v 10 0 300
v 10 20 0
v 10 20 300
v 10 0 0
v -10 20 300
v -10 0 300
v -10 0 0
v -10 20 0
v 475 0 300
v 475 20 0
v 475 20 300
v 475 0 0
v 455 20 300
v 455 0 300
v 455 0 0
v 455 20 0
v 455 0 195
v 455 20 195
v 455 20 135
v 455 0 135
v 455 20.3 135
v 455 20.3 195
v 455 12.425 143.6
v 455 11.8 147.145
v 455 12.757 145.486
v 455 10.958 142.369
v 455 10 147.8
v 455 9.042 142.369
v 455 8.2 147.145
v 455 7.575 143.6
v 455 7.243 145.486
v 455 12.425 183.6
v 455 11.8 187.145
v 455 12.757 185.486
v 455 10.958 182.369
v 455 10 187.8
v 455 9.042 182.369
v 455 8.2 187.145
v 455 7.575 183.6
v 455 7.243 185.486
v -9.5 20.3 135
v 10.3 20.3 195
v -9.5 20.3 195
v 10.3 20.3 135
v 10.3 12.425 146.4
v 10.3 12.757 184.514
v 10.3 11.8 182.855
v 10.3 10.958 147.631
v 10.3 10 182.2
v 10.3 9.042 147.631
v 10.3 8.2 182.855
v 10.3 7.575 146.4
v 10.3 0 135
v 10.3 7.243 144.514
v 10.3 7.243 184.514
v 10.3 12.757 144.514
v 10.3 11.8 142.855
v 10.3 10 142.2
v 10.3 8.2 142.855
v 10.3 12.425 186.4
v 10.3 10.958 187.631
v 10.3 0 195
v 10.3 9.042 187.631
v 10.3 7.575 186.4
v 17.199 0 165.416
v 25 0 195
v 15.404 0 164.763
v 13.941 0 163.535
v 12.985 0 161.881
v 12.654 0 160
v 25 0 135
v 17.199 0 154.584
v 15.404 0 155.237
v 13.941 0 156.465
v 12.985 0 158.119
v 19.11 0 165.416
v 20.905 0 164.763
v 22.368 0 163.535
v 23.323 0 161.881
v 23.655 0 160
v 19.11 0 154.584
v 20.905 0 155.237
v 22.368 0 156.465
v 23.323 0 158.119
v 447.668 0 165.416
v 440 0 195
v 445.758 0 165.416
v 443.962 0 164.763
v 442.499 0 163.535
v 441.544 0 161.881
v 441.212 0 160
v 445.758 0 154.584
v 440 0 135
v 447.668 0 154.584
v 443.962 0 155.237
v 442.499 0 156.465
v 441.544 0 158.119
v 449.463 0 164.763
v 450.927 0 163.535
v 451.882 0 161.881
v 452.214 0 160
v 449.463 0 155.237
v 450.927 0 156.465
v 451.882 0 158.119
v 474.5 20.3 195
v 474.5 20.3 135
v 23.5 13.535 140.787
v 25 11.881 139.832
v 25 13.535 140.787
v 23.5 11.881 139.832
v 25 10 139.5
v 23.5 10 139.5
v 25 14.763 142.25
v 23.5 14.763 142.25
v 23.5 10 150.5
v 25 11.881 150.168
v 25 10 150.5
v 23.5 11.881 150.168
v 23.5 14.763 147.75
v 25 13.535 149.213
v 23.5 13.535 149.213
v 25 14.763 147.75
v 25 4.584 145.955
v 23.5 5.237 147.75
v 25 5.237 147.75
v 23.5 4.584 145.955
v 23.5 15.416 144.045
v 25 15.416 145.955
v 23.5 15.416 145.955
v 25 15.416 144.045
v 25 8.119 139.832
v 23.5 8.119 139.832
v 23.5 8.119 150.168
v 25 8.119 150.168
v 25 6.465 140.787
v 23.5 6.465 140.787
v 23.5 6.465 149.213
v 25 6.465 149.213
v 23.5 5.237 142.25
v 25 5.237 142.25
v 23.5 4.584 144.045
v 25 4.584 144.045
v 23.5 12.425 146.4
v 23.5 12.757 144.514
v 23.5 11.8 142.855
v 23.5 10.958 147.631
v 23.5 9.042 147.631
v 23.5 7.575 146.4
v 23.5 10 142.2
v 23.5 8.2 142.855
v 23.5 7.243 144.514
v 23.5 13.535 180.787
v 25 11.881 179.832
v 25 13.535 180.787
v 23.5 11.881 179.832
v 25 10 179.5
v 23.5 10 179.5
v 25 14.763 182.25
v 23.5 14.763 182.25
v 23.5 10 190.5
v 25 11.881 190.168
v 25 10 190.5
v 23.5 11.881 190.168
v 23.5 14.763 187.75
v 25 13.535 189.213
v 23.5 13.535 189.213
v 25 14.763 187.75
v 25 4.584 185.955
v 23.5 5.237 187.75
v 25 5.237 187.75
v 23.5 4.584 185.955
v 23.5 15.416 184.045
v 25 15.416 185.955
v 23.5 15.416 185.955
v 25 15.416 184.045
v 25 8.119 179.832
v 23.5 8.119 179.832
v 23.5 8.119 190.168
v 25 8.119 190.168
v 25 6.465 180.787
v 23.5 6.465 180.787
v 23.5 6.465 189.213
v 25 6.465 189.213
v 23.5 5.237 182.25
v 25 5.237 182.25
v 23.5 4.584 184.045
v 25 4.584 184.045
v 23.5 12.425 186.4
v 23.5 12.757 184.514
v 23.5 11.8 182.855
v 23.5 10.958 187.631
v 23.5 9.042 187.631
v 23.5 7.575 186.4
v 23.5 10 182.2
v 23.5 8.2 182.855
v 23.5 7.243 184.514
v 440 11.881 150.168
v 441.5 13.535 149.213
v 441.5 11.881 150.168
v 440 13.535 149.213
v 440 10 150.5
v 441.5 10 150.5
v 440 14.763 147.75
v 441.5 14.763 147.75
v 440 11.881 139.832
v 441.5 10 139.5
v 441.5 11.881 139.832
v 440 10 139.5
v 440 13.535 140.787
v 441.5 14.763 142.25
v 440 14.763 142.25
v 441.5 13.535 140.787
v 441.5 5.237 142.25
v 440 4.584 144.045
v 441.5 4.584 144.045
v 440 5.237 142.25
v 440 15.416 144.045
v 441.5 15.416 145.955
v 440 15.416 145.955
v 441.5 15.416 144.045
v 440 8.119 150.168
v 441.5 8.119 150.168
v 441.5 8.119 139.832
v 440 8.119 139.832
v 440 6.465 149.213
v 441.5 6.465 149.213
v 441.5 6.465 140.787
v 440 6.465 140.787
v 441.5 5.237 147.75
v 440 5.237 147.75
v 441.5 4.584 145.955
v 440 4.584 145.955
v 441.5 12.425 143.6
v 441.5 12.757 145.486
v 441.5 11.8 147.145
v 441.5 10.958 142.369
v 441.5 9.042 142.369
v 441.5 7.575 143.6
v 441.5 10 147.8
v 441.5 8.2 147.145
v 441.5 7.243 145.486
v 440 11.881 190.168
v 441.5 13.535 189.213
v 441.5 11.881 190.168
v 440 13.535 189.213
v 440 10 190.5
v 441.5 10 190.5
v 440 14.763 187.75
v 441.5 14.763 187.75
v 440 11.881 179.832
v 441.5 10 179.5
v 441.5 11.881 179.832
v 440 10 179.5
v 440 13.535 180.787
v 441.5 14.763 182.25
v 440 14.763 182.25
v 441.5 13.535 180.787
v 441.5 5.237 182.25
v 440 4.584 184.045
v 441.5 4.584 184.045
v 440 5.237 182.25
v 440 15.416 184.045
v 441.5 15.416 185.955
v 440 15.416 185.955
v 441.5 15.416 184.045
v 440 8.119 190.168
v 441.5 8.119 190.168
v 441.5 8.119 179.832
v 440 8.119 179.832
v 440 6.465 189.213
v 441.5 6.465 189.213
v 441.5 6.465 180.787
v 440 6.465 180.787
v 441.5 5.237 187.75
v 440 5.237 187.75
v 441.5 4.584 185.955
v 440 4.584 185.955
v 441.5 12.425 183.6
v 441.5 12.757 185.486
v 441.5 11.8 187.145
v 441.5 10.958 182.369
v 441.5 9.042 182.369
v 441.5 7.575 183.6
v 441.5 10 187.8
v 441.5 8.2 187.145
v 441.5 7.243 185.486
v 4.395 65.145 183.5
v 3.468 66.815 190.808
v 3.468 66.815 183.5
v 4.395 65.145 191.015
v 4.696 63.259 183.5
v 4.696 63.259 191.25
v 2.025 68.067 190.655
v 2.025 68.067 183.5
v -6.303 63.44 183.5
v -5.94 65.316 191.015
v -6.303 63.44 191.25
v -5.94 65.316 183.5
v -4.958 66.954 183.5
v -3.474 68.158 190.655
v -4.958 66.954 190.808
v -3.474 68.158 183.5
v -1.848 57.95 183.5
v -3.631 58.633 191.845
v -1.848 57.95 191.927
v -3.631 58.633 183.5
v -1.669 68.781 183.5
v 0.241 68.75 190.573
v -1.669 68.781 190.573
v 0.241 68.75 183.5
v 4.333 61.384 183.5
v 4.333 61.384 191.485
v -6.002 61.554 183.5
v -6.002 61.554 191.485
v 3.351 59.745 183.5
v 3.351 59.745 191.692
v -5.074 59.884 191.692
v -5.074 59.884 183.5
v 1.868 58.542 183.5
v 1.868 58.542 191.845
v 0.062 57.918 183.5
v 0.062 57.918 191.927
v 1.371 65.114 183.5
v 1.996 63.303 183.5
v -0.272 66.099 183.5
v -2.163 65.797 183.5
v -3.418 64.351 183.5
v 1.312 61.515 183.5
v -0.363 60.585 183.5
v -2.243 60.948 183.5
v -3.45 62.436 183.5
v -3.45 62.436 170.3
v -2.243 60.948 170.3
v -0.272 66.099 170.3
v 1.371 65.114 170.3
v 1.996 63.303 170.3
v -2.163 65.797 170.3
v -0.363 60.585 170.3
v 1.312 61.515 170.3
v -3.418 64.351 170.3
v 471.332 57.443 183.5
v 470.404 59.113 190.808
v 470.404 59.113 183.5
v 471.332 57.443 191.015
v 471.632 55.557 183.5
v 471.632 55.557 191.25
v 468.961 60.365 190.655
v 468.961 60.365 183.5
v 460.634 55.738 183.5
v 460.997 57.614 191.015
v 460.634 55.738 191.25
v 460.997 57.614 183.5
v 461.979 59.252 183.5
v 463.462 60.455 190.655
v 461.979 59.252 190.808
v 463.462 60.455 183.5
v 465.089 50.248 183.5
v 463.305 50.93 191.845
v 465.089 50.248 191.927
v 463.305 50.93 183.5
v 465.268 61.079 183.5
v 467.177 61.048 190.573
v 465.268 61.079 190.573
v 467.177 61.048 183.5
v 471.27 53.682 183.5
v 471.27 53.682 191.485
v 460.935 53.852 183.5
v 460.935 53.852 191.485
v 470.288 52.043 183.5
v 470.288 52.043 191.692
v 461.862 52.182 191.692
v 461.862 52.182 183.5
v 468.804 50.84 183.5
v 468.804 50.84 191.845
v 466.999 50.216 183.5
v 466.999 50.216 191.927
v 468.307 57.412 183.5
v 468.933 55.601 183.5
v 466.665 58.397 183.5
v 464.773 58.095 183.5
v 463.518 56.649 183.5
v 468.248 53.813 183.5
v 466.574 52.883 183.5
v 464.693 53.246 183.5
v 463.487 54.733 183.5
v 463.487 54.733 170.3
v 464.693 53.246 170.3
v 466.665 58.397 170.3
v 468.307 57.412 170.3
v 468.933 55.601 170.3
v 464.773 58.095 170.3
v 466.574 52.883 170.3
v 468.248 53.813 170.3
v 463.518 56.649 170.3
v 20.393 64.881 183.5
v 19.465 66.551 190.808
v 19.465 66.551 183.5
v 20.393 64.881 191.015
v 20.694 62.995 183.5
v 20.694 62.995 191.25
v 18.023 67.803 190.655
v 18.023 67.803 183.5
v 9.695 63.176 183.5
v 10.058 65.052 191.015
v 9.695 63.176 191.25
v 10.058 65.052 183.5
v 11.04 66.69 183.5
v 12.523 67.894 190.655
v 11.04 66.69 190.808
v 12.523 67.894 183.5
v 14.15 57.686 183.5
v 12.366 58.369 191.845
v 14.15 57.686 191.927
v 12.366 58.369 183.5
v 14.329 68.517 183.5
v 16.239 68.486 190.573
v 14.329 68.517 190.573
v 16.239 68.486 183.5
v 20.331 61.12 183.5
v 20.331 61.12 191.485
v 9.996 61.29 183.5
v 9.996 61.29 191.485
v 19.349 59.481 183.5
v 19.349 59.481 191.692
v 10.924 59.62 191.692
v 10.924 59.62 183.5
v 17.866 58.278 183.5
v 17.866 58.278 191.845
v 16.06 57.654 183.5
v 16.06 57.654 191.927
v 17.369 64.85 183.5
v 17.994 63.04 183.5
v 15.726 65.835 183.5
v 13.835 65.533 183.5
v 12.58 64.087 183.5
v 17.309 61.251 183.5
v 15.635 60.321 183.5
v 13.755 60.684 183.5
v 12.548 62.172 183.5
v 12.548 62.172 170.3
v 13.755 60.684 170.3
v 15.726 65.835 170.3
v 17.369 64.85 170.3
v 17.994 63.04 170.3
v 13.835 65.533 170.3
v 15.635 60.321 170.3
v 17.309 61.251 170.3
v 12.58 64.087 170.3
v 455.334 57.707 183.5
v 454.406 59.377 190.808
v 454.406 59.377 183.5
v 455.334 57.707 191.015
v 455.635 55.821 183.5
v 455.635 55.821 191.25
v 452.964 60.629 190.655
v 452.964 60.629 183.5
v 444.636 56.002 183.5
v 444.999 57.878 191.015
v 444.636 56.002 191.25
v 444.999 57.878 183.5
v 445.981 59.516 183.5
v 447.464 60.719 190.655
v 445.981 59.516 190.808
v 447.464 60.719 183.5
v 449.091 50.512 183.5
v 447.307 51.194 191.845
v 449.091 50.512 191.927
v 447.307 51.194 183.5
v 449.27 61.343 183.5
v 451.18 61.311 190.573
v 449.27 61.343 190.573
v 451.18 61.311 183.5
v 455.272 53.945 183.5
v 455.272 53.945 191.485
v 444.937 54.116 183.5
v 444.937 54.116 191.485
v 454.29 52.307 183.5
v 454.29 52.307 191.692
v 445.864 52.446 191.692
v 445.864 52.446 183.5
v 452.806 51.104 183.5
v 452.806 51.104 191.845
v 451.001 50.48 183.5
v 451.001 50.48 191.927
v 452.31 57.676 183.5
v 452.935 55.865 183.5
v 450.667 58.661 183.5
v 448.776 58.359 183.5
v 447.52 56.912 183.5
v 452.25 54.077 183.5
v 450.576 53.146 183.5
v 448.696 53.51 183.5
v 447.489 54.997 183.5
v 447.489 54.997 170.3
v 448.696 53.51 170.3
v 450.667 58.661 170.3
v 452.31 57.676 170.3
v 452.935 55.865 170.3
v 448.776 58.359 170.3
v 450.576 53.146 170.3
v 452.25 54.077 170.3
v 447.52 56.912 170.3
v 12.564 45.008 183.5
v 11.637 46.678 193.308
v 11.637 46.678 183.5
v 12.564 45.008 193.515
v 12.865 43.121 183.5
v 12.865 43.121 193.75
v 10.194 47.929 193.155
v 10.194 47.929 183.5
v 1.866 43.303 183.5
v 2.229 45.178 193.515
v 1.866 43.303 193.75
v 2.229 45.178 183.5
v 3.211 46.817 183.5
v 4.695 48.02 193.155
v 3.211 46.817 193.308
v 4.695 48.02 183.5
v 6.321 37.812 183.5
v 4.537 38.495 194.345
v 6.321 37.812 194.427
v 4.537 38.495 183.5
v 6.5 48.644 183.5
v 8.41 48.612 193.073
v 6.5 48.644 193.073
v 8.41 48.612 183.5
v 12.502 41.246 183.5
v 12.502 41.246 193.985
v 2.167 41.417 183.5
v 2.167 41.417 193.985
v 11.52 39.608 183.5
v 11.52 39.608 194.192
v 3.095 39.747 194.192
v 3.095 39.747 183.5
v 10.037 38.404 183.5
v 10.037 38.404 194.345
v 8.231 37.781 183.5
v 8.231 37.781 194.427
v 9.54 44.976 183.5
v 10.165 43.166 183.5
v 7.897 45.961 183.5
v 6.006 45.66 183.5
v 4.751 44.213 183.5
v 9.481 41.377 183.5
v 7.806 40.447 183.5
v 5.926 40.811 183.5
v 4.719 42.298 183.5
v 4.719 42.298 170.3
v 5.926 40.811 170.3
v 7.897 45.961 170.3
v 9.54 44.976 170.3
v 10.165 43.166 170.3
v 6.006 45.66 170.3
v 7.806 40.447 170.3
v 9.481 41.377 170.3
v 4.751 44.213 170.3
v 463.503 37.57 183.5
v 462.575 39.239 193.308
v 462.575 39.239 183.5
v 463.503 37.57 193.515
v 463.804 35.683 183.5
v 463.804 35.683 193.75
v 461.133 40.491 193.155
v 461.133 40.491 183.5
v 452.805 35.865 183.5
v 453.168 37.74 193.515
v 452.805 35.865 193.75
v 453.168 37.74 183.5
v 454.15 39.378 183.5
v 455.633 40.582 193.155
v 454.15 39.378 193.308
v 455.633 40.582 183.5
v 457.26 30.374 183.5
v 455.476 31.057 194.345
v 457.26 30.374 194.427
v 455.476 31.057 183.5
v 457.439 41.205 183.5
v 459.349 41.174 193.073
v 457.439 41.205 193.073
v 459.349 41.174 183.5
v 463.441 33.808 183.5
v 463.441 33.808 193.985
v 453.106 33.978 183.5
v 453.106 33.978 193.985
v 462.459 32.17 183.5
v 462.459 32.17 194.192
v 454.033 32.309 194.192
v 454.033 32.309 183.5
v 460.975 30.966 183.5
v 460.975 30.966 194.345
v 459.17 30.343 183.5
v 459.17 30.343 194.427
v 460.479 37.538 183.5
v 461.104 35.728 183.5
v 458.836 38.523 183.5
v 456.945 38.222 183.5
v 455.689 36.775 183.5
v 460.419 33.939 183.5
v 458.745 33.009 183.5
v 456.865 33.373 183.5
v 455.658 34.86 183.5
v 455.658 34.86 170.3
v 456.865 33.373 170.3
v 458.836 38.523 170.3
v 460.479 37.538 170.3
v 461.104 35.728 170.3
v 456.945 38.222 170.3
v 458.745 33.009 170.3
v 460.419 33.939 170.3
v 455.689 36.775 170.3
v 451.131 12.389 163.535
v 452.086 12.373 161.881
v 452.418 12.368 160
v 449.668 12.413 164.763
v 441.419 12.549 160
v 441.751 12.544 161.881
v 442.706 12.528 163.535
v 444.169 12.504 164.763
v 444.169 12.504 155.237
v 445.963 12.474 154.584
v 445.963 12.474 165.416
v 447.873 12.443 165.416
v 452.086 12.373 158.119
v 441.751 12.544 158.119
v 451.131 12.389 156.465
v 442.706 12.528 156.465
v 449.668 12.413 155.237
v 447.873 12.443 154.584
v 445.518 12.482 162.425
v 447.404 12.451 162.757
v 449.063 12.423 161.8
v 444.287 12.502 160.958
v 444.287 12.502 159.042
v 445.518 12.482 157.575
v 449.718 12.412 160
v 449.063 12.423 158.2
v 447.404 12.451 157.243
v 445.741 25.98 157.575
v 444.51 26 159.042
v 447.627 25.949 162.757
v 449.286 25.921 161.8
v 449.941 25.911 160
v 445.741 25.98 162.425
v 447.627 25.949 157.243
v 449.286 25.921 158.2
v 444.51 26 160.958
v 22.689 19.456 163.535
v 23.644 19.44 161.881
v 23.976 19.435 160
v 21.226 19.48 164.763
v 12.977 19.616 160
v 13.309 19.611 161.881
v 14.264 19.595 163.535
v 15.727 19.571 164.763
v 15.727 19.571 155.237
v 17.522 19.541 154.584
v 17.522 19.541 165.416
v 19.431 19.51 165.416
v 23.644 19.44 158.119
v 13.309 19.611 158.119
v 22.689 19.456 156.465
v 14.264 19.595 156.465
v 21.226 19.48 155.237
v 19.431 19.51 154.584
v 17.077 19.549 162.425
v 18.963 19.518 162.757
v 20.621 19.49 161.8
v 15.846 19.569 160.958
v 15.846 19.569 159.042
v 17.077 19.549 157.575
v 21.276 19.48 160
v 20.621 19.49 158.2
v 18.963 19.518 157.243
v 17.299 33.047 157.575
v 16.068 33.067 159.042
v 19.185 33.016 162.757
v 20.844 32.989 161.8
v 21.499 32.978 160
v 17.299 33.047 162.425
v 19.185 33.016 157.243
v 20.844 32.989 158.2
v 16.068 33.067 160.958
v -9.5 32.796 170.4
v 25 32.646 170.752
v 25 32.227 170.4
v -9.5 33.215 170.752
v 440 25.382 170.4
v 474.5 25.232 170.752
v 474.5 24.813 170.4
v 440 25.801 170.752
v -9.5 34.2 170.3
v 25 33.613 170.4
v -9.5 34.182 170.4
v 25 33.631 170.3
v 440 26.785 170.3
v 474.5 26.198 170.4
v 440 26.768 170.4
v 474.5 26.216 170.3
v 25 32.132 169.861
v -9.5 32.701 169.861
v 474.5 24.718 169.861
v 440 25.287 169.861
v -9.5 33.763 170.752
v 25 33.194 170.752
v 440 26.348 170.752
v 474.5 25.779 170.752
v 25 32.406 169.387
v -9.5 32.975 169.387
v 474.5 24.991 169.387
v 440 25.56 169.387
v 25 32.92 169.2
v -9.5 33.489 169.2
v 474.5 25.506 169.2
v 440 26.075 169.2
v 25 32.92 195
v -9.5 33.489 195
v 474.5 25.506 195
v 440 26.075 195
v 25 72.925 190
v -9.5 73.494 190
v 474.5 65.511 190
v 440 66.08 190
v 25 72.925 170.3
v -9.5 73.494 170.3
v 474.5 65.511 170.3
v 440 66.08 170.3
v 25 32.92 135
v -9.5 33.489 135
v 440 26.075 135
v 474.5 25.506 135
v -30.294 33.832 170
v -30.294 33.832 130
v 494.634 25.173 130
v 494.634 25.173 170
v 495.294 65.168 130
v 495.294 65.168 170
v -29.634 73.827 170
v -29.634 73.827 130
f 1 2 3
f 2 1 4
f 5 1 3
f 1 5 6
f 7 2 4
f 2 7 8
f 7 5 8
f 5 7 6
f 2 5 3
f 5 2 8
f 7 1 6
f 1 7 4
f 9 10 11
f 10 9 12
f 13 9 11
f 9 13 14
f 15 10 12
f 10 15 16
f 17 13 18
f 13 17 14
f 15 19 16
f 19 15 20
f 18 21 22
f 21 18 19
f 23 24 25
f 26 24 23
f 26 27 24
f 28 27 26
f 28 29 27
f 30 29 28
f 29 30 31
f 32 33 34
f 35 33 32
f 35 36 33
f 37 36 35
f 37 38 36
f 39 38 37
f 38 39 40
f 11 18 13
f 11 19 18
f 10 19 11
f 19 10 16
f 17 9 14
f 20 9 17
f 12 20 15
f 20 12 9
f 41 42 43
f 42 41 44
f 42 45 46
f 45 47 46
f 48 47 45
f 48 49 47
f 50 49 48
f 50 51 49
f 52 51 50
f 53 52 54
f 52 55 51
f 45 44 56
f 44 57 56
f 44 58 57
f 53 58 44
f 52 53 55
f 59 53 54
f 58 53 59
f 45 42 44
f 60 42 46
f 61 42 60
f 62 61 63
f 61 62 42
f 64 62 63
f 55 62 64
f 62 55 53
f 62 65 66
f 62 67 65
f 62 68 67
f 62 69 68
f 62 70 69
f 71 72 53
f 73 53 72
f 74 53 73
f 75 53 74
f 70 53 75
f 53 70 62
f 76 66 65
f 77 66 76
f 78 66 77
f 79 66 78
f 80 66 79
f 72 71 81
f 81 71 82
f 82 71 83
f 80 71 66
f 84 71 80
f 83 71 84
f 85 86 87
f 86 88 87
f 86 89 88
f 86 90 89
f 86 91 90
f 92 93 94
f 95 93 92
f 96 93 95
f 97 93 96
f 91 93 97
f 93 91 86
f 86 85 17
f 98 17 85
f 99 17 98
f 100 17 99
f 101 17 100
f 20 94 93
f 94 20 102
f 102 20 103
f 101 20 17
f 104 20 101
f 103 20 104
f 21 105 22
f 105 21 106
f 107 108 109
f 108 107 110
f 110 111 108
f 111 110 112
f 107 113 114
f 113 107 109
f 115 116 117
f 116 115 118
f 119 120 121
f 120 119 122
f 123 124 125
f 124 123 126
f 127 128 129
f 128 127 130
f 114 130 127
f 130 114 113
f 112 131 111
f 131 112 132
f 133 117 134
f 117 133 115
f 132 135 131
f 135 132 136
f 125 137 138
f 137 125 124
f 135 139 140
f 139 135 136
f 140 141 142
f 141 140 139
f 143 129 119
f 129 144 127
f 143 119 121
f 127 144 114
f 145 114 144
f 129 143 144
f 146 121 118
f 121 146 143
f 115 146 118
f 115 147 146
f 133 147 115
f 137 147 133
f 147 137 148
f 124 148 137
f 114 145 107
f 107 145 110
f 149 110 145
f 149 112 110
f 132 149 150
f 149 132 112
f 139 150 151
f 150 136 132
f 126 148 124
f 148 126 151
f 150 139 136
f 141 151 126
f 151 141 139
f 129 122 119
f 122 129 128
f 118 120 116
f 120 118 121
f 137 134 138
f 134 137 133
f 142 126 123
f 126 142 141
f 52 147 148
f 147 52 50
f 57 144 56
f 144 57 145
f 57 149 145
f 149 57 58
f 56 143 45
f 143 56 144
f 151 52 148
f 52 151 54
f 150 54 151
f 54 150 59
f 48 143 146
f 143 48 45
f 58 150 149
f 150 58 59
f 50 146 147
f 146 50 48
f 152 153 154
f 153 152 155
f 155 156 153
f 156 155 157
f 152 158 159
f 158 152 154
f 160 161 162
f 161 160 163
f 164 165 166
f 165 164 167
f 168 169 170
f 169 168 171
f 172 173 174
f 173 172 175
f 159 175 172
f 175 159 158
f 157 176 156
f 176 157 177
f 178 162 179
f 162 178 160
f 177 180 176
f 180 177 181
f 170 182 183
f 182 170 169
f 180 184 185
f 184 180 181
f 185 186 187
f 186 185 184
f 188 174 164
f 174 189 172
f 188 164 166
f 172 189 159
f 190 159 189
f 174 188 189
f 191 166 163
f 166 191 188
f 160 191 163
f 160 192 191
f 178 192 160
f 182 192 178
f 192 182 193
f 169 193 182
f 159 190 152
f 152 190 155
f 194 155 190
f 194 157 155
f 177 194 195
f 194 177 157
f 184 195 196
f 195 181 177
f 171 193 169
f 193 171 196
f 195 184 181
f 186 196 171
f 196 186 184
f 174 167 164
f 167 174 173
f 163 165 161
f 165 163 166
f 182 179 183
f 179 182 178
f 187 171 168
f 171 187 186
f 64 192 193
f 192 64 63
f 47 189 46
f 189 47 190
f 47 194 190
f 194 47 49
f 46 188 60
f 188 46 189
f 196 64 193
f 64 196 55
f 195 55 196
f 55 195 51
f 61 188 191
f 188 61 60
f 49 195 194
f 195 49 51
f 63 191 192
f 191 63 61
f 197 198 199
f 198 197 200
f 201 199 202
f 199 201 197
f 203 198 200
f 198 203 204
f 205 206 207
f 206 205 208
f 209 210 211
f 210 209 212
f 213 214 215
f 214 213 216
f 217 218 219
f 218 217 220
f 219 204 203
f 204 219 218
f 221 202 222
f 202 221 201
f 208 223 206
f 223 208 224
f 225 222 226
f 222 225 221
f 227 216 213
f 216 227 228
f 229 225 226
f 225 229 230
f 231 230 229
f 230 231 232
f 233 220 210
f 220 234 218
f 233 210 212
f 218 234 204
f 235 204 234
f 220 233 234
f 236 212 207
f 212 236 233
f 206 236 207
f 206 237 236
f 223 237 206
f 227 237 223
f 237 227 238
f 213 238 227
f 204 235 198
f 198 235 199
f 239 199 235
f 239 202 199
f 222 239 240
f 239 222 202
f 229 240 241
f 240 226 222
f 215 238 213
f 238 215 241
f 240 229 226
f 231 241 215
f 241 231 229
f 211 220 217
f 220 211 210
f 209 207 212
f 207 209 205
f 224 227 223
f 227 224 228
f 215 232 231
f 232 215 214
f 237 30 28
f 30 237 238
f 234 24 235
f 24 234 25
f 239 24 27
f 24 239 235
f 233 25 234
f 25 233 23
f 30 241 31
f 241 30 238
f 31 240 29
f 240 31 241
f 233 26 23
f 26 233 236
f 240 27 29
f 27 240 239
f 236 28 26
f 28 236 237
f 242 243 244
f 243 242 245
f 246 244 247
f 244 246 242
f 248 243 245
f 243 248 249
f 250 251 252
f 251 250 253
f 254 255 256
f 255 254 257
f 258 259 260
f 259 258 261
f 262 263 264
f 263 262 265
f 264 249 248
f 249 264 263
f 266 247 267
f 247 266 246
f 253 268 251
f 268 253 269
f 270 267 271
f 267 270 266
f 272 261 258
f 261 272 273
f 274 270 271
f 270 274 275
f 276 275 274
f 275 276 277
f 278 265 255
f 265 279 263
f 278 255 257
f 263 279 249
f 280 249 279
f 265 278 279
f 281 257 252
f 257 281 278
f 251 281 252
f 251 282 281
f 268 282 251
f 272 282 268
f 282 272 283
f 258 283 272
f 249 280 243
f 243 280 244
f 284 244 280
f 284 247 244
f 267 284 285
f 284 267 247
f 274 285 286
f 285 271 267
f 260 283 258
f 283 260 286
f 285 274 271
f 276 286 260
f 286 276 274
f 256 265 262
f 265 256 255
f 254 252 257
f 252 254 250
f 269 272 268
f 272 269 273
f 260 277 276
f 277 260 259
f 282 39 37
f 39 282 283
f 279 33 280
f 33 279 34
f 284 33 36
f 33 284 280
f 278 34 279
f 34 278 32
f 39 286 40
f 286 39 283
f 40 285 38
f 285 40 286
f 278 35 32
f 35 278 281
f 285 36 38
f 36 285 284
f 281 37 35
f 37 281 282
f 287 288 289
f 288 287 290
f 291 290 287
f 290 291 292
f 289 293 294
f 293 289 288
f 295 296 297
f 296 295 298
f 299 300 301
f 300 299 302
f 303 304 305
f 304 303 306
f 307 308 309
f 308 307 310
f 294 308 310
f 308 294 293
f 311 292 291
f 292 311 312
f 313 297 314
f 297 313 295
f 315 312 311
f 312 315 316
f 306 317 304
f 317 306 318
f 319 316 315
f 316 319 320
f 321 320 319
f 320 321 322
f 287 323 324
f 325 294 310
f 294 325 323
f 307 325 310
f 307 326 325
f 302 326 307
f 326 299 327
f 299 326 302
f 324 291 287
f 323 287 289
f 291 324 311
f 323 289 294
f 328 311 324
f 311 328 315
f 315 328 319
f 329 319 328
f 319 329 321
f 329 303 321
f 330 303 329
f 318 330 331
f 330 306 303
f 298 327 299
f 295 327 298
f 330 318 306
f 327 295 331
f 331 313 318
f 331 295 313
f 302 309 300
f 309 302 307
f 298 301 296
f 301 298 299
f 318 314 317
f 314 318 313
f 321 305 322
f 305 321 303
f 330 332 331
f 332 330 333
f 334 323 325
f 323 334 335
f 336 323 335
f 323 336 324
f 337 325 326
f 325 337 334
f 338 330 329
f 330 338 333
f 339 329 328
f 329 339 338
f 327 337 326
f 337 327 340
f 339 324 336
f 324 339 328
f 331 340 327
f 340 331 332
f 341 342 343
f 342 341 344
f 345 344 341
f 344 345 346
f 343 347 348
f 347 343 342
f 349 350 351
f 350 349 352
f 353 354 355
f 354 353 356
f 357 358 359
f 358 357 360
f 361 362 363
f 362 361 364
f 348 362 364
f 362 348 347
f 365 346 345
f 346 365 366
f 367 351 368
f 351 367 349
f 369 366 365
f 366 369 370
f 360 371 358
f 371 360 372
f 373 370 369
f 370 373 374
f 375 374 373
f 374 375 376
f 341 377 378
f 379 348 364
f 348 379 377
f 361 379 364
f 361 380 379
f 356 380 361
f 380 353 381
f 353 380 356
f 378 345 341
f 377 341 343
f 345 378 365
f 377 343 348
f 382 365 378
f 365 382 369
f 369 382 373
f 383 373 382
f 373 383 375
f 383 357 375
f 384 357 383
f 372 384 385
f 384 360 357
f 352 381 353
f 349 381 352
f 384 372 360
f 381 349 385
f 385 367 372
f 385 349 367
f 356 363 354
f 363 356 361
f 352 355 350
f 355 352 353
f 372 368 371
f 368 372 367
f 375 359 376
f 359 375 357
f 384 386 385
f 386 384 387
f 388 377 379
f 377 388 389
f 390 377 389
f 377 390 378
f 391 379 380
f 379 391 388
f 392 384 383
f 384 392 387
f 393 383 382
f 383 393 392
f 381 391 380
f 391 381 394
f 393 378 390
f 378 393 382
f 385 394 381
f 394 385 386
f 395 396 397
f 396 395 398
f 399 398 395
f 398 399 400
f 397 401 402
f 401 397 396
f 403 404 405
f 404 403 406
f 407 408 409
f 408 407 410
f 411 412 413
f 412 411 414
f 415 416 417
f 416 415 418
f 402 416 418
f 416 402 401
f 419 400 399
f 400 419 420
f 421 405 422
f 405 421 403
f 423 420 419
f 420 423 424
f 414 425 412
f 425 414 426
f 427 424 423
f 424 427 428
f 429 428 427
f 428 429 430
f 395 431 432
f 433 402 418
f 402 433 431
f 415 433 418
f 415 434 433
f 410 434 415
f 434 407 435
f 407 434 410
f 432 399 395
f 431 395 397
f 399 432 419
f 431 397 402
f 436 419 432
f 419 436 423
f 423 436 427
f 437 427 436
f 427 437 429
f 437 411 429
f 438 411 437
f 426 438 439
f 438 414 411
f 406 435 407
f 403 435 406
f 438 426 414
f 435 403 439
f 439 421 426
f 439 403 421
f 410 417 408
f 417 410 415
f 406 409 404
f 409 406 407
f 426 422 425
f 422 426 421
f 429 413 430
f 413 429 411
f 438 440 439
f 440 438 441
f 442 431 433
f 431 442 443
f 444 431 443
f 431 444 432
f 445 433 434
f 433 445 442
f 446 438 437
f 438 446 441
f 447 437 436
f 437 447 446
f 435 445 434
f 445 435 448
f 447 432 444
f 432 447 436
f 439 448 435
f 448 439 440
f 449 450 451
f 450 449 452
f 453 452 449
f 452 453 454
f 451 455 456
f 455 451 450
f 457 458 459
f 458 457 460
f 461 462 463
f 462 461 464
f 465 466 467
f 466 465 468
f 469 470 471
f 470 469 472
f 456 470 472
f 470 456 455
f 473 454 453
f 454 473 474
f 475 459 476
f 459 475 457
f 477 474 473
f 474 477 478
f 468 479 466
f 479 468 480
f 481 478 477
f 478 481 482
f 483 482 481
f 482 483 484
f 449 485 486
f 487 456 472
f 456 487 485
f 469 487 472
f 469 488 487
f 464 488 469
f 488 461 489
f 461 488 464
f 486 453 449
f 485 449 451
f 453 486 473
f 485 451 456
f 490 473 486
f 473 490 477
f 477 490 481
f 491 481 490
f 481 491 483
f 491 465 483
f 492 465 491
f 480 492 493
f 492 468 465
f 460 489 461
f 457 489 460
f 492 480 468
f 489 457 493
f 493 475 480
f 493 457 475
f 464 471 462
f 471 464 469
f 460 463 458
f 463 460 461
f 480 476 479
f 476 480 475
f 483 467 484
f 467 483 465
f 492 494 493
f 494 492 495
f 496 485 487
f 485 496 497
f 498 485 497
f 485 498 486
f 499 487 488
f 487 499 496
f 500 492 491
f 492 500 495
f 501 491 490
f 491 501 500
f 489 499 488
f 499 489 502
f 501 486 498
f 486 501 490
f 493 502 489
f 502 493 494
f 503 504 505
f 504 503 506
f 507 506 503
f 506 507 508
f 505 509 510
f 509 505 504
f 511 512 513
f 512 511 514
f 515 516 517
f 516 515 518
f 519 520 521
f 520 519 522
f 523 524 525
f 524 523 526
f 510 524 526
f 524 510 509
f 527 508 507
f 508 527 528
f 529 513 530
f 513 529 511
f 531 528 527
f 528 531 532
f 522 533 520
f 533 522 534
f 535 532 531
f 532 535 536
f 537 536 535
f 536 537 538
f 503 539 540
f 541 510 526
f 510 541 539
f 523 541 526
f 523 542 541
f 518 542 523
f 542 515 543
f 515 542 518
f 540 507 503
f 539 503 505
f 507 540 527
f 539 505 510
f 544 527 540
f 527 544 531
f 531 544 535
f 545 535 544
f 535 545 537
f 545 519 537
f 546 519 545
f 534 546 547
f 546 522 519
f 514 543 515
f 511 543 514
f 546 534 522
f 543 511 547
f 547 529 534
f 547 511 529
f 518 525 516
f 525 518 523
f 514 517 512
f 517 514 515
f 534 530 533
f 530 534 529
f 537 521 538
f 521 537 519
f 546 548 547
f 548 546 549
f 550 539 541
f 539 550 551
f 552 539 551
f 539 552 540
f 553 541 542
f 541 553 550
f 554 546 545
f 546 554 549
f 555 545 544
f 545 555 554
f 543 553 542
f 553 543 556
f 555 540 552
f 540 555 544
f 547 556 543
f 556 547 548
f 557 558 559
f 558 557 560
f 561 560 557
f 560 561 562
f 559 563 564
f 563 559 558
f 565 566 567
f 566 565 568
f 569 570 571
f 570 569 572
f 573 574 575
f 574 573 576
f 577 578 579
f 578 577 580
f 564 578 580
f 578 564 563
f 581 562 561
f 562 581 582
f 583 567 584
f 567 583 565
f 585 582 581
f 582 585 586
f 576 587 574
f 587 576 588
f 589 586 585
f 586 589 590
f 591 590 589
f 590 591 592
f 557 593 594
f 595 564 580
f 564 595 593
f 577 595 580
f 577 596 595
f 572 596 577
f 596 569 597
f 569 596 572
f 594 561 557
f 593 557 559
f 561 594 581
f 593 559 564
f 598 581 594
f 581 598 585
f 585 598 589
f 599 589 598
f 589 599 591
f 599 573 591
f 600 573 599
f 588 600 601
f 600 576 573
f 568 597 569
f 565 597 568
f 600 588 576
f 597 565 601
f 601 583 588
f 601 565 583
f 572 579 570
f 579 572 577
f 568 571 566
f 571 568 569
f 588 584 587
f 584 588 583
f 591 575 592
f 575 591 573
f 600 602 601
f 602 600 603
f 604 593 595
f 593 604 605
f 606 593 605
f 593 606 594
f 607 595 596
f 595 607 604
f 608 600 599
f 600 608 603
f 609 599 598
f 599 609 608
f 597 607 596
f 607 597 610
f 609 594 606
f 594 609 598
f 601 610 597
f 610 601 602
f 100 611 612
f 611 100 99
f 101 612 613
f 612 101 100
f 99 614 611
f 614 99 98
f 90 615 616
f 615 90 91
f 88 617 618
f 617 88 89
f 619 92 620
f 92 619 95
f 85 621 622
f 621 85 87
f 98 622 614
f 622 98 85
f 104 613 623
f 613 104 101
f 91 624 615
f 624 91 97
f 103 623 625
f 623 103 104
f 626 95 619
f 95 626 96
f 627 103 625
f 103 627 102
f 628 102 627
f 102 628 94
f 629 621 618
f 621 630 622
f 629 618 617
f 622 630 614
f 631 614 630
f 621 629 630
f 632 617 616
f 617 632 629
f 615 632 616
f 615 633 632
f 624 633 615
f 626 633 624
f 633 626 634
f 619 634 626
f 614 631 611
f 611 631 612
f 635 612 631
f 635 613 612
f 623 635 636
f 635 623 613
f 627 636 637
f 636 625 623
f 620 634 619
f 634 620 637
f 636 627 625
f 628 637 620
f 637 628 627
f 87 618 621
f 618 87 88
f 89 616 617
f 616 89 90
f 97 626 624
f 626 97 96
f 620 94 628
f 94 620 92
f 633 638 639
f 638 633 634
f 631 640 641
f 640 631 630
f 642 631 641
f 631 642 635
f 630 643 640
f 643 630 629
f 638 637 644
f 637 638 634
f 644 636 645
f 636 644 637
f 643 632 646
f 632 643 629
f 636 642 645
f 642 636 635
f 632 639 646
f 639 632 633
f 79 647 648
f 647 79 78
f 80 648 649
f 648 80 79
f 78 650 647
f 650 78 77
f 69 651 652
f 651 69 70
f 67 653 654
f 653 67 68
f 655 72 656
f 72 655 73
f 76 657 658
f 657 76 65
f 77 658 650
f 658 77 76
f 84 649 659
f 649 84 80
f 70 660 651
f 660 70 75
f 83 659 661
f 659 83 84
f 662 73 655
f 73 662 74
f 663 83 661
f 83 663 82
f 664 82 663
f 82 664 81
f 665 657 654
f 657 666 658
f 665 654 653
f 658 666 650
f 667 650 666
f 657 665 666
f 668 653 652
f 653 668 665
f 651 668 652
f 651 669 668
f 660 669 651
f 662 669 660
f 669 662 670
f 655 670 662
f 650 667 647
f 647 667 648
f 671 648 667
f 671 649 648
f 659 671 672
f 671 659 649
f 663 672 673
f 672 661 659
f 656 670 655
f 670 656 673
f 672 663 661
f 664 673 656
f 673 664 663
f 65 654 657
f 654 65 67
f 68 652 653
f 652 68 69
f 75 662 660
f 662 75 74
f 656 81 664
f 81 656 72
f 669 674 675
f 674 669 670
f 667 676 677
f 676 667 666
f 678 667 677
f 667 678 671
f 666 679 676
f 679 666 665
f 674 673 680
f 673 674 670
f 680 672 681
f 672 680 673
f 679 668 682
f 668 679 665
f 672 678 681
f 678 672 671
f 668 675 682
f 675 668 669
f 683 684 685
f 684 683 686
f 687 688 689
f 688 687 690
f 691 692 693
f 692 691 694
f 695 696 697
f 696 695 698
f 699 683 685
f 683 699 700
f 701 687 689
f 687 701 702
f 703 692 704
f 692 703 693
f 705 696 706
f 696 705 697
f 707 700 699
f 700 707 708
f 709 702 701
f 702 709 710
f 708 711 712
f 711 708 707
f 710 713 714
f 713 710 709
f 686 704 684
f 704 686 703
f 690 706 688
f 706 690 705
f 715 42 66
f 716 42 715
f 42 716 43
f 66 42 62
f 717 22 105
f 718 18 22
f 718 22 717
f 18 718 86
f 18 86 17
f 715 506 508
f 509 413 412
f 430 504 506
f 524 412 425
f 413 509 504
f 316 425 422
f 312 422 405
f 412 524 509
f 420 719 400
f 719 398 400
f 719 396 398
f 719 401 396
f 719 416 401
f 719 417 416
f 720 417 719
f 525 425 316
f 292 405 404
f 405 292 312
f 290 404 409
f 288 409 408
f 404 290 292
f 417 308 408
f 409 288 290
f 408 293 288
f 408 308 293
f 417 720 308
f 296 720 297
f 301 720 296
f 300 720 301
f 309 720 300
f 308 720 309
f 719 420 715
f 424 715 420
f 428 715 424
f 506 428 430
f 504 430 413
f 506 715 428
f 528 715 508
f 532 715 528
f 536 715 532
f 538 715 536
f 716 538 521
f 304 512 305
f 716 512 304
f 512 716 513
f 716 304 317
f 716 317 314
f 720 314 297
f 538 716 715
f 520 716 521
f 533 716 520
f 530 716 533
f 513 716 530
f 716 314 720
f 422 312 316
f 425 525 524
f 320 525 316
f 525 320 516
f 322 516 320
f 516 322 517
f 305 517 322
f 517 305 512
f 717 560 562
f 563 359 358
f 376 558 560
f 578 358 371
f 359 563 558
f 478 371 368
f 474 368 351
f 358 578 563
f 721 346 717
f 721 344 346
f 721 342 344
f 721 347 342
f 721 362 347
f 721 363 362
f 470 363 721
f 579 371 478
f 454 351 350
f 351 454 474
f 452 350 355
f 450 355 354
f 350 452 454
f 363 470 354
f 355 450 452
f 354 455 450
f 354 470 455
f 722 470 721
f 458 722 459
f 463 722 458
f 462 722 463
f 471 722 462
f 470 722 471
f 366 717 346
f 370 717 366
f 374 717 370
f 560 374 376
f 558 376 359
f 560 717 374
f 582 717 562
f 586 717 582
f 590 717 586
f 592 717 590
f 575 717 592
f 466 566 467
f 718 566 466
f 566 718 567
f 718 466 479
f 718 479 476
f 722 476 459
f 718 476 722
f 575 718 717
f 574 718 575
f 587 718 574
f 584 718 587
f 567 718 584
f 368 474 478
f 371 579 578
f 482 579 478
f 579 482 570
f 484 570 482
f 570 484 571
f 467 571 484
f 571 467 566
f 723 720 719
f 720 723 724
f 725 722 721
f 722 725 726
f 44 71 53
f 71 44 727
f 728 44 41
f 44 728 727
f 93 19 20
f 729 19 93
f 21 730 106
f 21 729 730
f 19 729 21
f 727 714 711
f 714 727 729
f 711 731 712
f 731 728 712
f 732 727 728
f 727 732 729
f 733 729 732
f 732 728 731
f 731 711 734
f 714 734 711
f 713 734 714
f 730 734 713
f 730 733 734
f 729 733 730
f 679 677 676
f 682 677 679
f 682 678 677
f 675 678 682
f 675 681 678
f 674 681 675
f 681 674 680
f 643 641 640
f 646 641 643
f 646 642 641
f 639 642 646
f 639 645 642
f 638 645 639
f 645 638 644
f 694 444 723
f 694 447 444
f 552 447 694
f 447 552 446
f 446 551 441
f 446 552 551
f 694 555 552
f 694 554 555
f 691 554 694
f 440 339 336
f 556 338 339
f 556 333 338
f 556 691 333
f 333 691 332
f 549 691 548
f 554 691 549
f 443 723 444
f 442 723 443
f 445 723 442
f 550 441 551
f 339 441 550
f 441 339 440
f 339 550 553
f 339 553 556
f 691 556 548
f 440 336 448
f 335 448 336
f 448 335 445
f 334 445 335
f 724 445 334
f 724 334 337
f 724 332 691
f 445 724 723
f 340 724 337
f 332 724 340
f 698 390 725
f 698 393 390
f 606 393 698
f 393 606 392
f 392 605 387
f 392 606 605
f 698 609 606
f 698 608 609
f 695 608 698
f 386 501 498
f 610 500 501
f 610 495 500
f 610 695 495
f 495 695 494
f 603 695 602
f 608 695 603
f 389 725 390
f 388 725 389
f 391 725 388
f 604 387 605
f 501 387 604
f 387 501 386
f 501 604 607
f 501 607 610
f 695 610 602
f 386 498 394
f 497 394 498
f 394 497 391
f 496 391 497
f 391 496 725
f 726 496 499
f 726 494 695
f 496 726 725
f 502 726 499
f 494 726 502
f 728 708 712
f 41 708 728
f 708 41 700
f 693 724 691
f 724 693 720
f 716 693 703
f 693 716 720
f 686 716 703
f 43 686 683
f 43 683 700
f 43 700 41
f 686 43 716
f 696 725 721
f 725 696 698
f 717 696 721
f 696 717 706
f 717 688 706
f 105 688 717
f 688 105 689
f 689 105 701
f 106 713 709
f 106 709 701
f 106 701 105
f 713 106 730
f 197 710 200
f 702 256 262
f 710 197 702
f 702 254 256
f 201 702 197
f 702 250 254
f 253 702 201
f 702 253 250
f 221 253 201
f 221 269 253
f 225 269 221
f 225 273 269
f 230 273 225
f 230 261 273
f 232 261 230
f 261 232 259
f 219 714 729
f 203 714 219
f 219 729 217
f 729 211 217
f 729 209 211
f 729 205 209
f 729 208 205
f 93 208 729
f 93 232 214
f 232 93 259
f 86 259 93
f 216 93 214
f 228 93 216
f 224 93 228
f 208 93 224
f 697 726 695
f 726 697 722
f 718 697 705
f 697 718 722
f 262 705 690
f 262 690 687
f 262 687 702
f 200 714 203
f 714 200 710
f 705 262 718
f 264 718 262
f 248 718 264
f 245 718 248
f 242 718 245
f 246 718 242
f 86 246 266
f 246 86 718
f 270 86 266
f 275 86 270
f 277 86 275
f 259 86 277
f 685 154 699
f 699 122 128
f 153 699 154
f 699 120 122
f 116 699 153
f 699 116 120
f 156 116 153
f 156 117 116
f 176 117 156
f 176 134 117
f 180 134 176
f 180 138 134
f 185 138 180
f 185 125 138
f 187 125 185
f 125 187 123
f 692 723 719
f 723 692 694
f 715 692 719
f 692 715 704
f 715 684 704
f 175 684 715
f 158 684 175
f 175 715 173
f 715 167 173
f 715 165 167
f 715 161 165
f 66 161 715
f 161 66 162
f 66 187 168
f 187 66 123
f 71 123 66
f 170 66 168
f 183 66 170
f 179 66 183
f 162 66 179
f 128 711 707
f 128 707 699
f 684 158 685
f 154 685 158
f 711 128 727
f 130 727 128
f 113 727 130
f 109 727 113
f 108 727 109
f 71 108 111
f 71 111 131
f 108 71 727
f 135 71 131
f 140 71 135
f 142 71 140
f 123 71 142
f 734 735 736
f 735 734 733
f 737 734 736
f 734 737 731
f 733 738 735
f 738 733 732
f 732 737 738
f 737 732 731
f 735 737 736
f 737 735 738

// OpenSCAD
// center to center
support_spacing = 465;
// outer edge to outer edge
// serves as a defined location for making measurements
// stickout and raise are defined at the outer edges
support_spacing_oe2oe = 465 + 10 + 10;

left_raise = 0;
right_raise = 0;
min_raise = min(left_raise, right_raise);
max_raise = max(left_raise, right_raise);
raise_dir = left_raise > right_raise ? -1 : 1;

left_stickout = 5.5;
right_stickout = 13.5;
min_stickout = min(left_stickout, right_stickout);
max_stickout = max(left_stickout, right_stickout);
stickout_dir = left_stickout > right_stickout ? 1 : -1;

module m5_screw_hole(_length) {
    //4040, or 2020 w/washer
    depth_into_extrusion = 5.5;
    //2020 w/o washer
    //depth_into_extrusion = 4.75;
    length = _length - 1;
    translate([0,0,(length-depth_into_extrusion)])
      cylinder(h=(60-(length-depth_into_extrusion)), d=11);
    translate([0,0,-depth_into_extrusion])
      cylinder(h=length, d=5.6);
}

// support structure
module verticals() {
union() {
  // right
  cube([20, 20, 300]);
  // left
  translate([support_spacing, 0, 0])
    cube([20, 20, 300]);
}
}

// beam
module beam() {
translate([10 + support_spacing/2,
           20 + 20 + min_stickout + 0.5*(max_stickout-min_stickout),
           150])
  rotate([0,
          raise_dir*atan2(max_raise-min_raise, support_spacing_oe2oe),
          stickout_dir*atan2(max_stickout-min_stickout, support_spacing_oe2oe)]) {
    cube([support_spacing + 60, 40, 40], center=true);
          }
}

module raw_mount() {
translate([10 + support_spacing/2,
           20 + 20 + min_stickout + 0.5*(max_stickout-min_stickout),
           150])
  rotate([0,
          raise_dir*atan2(max_raise-min_raise, support_spacing_oe2oe),
          stickout_dir*atan2(max_stickout-min_stickout, support_spacing_oe2oe)])
    translate([0,-20,20])
    rotate([0,90,0])
    linear_extrude(height=support_spacing+60, center=true)
      polygon(points=[[-25,-(max_stickout+30)],
                      [-25, 0],
                      [-20,40],
                      [35,40],
                      [35,-(max_stickout+30)]]);
}


module mount() {
    difference() {
        raw_mount();
        minkowski() {
          beam();
          cube([0.3,0.3,0.3]);
        }
        minkowski() {
          verticals();
          cube([0.3,0.3,0.3]);
        }
        translate([0,-100,0])
          cube([support_spacing+80, 100, 300]);
        translate([-100,-150,0])
          cube([100+0.5, 300, 300]);
        translate([support_spacing+20-0.5,-150,0])
          cube([100, 300, 300]);
        translate([35, -10, 0])
          cube([support_spacing - 50, 300, 300]);
     
        translate([20, 10, 150+right_raise-5])   
          rotate([0,90,0])
            m5_screw_hole(20);
        translate([20, 10, 150+right_raise+35])   
          rotate([0,90,0])
            m5_screw_hole(20);

        translate([support_spacing, 10, 150+left_raise-5])   
          rotate([0,-90,0])
            m5_screw_hole(20);
        translate([support_spacing, 10, 150+left_raise+35])   
          rotate([0,-90,0])
            m5_screw_hole(20);

translate([10 + support_spacing/2,
           20 + 20 + min_stickout + 0.5*(max_stickout-min_stickout),
           150])
  rotate([0,
          raise_dir*atan2(max_raise-min_raise, support_spacing_oe2oe),
          stickout_dir*atan2(max_stickout-min_stickout, support_spacing_oe2oe)]) {
             translate([0, -20, 20]) rotate([0,90,0])
               cylinder(h=support_spacing+60, r=0.8, center=true, $fn=9);

              translate([-(support_spacing/2)-1, 10, 20])
                m5_screw_hole(20);
              translate([(support_spacing/2)+1, 10, 20])
                m5_screw_hole(20);
              
              translate([-(support_spacing/2)+15, 10, 20])
                m5_screw_hole(20);
              translate([(support_spacing/2)-15, 10, 20])
                m5_screw_hole(20);

              translate([-(support_spacing/2)+7.5, -10, 20])
                m5_screw_hole(20);
              translate([(support_spacing/2)-6.5, -10, 20])
                m5_screw_hole(20);

              // !!!! the -16 and +19 here are fairly hand tweaked
              // and may not survive adjustments
              translate([(support_spacing/2)-17.5, -20, 10])
                rotate([90,0,0])
                  m5_screw_hole(20);
              translate([-(support_spacing/2)+19, -20, 10])
                rotate([90,0,0])
                  m5_screw_hole(20);
          }

    }
}

module right_mount() {
  intersection() {
    mount();
    translate([0,0,75+right_raise])
      cube([150, 150, 150]);
  }
}

module left_mount() {
  intersection() {
    mount();
    translate([support_spacing-75,0,75+left_raise])
      cube([150, 150, 150]);
  }
}

translate([-10, 0, 0]) {
color("orangered") verticals();
beam();
//left_mount();
//right_mount();
color("dodgerblue") mount();
}
